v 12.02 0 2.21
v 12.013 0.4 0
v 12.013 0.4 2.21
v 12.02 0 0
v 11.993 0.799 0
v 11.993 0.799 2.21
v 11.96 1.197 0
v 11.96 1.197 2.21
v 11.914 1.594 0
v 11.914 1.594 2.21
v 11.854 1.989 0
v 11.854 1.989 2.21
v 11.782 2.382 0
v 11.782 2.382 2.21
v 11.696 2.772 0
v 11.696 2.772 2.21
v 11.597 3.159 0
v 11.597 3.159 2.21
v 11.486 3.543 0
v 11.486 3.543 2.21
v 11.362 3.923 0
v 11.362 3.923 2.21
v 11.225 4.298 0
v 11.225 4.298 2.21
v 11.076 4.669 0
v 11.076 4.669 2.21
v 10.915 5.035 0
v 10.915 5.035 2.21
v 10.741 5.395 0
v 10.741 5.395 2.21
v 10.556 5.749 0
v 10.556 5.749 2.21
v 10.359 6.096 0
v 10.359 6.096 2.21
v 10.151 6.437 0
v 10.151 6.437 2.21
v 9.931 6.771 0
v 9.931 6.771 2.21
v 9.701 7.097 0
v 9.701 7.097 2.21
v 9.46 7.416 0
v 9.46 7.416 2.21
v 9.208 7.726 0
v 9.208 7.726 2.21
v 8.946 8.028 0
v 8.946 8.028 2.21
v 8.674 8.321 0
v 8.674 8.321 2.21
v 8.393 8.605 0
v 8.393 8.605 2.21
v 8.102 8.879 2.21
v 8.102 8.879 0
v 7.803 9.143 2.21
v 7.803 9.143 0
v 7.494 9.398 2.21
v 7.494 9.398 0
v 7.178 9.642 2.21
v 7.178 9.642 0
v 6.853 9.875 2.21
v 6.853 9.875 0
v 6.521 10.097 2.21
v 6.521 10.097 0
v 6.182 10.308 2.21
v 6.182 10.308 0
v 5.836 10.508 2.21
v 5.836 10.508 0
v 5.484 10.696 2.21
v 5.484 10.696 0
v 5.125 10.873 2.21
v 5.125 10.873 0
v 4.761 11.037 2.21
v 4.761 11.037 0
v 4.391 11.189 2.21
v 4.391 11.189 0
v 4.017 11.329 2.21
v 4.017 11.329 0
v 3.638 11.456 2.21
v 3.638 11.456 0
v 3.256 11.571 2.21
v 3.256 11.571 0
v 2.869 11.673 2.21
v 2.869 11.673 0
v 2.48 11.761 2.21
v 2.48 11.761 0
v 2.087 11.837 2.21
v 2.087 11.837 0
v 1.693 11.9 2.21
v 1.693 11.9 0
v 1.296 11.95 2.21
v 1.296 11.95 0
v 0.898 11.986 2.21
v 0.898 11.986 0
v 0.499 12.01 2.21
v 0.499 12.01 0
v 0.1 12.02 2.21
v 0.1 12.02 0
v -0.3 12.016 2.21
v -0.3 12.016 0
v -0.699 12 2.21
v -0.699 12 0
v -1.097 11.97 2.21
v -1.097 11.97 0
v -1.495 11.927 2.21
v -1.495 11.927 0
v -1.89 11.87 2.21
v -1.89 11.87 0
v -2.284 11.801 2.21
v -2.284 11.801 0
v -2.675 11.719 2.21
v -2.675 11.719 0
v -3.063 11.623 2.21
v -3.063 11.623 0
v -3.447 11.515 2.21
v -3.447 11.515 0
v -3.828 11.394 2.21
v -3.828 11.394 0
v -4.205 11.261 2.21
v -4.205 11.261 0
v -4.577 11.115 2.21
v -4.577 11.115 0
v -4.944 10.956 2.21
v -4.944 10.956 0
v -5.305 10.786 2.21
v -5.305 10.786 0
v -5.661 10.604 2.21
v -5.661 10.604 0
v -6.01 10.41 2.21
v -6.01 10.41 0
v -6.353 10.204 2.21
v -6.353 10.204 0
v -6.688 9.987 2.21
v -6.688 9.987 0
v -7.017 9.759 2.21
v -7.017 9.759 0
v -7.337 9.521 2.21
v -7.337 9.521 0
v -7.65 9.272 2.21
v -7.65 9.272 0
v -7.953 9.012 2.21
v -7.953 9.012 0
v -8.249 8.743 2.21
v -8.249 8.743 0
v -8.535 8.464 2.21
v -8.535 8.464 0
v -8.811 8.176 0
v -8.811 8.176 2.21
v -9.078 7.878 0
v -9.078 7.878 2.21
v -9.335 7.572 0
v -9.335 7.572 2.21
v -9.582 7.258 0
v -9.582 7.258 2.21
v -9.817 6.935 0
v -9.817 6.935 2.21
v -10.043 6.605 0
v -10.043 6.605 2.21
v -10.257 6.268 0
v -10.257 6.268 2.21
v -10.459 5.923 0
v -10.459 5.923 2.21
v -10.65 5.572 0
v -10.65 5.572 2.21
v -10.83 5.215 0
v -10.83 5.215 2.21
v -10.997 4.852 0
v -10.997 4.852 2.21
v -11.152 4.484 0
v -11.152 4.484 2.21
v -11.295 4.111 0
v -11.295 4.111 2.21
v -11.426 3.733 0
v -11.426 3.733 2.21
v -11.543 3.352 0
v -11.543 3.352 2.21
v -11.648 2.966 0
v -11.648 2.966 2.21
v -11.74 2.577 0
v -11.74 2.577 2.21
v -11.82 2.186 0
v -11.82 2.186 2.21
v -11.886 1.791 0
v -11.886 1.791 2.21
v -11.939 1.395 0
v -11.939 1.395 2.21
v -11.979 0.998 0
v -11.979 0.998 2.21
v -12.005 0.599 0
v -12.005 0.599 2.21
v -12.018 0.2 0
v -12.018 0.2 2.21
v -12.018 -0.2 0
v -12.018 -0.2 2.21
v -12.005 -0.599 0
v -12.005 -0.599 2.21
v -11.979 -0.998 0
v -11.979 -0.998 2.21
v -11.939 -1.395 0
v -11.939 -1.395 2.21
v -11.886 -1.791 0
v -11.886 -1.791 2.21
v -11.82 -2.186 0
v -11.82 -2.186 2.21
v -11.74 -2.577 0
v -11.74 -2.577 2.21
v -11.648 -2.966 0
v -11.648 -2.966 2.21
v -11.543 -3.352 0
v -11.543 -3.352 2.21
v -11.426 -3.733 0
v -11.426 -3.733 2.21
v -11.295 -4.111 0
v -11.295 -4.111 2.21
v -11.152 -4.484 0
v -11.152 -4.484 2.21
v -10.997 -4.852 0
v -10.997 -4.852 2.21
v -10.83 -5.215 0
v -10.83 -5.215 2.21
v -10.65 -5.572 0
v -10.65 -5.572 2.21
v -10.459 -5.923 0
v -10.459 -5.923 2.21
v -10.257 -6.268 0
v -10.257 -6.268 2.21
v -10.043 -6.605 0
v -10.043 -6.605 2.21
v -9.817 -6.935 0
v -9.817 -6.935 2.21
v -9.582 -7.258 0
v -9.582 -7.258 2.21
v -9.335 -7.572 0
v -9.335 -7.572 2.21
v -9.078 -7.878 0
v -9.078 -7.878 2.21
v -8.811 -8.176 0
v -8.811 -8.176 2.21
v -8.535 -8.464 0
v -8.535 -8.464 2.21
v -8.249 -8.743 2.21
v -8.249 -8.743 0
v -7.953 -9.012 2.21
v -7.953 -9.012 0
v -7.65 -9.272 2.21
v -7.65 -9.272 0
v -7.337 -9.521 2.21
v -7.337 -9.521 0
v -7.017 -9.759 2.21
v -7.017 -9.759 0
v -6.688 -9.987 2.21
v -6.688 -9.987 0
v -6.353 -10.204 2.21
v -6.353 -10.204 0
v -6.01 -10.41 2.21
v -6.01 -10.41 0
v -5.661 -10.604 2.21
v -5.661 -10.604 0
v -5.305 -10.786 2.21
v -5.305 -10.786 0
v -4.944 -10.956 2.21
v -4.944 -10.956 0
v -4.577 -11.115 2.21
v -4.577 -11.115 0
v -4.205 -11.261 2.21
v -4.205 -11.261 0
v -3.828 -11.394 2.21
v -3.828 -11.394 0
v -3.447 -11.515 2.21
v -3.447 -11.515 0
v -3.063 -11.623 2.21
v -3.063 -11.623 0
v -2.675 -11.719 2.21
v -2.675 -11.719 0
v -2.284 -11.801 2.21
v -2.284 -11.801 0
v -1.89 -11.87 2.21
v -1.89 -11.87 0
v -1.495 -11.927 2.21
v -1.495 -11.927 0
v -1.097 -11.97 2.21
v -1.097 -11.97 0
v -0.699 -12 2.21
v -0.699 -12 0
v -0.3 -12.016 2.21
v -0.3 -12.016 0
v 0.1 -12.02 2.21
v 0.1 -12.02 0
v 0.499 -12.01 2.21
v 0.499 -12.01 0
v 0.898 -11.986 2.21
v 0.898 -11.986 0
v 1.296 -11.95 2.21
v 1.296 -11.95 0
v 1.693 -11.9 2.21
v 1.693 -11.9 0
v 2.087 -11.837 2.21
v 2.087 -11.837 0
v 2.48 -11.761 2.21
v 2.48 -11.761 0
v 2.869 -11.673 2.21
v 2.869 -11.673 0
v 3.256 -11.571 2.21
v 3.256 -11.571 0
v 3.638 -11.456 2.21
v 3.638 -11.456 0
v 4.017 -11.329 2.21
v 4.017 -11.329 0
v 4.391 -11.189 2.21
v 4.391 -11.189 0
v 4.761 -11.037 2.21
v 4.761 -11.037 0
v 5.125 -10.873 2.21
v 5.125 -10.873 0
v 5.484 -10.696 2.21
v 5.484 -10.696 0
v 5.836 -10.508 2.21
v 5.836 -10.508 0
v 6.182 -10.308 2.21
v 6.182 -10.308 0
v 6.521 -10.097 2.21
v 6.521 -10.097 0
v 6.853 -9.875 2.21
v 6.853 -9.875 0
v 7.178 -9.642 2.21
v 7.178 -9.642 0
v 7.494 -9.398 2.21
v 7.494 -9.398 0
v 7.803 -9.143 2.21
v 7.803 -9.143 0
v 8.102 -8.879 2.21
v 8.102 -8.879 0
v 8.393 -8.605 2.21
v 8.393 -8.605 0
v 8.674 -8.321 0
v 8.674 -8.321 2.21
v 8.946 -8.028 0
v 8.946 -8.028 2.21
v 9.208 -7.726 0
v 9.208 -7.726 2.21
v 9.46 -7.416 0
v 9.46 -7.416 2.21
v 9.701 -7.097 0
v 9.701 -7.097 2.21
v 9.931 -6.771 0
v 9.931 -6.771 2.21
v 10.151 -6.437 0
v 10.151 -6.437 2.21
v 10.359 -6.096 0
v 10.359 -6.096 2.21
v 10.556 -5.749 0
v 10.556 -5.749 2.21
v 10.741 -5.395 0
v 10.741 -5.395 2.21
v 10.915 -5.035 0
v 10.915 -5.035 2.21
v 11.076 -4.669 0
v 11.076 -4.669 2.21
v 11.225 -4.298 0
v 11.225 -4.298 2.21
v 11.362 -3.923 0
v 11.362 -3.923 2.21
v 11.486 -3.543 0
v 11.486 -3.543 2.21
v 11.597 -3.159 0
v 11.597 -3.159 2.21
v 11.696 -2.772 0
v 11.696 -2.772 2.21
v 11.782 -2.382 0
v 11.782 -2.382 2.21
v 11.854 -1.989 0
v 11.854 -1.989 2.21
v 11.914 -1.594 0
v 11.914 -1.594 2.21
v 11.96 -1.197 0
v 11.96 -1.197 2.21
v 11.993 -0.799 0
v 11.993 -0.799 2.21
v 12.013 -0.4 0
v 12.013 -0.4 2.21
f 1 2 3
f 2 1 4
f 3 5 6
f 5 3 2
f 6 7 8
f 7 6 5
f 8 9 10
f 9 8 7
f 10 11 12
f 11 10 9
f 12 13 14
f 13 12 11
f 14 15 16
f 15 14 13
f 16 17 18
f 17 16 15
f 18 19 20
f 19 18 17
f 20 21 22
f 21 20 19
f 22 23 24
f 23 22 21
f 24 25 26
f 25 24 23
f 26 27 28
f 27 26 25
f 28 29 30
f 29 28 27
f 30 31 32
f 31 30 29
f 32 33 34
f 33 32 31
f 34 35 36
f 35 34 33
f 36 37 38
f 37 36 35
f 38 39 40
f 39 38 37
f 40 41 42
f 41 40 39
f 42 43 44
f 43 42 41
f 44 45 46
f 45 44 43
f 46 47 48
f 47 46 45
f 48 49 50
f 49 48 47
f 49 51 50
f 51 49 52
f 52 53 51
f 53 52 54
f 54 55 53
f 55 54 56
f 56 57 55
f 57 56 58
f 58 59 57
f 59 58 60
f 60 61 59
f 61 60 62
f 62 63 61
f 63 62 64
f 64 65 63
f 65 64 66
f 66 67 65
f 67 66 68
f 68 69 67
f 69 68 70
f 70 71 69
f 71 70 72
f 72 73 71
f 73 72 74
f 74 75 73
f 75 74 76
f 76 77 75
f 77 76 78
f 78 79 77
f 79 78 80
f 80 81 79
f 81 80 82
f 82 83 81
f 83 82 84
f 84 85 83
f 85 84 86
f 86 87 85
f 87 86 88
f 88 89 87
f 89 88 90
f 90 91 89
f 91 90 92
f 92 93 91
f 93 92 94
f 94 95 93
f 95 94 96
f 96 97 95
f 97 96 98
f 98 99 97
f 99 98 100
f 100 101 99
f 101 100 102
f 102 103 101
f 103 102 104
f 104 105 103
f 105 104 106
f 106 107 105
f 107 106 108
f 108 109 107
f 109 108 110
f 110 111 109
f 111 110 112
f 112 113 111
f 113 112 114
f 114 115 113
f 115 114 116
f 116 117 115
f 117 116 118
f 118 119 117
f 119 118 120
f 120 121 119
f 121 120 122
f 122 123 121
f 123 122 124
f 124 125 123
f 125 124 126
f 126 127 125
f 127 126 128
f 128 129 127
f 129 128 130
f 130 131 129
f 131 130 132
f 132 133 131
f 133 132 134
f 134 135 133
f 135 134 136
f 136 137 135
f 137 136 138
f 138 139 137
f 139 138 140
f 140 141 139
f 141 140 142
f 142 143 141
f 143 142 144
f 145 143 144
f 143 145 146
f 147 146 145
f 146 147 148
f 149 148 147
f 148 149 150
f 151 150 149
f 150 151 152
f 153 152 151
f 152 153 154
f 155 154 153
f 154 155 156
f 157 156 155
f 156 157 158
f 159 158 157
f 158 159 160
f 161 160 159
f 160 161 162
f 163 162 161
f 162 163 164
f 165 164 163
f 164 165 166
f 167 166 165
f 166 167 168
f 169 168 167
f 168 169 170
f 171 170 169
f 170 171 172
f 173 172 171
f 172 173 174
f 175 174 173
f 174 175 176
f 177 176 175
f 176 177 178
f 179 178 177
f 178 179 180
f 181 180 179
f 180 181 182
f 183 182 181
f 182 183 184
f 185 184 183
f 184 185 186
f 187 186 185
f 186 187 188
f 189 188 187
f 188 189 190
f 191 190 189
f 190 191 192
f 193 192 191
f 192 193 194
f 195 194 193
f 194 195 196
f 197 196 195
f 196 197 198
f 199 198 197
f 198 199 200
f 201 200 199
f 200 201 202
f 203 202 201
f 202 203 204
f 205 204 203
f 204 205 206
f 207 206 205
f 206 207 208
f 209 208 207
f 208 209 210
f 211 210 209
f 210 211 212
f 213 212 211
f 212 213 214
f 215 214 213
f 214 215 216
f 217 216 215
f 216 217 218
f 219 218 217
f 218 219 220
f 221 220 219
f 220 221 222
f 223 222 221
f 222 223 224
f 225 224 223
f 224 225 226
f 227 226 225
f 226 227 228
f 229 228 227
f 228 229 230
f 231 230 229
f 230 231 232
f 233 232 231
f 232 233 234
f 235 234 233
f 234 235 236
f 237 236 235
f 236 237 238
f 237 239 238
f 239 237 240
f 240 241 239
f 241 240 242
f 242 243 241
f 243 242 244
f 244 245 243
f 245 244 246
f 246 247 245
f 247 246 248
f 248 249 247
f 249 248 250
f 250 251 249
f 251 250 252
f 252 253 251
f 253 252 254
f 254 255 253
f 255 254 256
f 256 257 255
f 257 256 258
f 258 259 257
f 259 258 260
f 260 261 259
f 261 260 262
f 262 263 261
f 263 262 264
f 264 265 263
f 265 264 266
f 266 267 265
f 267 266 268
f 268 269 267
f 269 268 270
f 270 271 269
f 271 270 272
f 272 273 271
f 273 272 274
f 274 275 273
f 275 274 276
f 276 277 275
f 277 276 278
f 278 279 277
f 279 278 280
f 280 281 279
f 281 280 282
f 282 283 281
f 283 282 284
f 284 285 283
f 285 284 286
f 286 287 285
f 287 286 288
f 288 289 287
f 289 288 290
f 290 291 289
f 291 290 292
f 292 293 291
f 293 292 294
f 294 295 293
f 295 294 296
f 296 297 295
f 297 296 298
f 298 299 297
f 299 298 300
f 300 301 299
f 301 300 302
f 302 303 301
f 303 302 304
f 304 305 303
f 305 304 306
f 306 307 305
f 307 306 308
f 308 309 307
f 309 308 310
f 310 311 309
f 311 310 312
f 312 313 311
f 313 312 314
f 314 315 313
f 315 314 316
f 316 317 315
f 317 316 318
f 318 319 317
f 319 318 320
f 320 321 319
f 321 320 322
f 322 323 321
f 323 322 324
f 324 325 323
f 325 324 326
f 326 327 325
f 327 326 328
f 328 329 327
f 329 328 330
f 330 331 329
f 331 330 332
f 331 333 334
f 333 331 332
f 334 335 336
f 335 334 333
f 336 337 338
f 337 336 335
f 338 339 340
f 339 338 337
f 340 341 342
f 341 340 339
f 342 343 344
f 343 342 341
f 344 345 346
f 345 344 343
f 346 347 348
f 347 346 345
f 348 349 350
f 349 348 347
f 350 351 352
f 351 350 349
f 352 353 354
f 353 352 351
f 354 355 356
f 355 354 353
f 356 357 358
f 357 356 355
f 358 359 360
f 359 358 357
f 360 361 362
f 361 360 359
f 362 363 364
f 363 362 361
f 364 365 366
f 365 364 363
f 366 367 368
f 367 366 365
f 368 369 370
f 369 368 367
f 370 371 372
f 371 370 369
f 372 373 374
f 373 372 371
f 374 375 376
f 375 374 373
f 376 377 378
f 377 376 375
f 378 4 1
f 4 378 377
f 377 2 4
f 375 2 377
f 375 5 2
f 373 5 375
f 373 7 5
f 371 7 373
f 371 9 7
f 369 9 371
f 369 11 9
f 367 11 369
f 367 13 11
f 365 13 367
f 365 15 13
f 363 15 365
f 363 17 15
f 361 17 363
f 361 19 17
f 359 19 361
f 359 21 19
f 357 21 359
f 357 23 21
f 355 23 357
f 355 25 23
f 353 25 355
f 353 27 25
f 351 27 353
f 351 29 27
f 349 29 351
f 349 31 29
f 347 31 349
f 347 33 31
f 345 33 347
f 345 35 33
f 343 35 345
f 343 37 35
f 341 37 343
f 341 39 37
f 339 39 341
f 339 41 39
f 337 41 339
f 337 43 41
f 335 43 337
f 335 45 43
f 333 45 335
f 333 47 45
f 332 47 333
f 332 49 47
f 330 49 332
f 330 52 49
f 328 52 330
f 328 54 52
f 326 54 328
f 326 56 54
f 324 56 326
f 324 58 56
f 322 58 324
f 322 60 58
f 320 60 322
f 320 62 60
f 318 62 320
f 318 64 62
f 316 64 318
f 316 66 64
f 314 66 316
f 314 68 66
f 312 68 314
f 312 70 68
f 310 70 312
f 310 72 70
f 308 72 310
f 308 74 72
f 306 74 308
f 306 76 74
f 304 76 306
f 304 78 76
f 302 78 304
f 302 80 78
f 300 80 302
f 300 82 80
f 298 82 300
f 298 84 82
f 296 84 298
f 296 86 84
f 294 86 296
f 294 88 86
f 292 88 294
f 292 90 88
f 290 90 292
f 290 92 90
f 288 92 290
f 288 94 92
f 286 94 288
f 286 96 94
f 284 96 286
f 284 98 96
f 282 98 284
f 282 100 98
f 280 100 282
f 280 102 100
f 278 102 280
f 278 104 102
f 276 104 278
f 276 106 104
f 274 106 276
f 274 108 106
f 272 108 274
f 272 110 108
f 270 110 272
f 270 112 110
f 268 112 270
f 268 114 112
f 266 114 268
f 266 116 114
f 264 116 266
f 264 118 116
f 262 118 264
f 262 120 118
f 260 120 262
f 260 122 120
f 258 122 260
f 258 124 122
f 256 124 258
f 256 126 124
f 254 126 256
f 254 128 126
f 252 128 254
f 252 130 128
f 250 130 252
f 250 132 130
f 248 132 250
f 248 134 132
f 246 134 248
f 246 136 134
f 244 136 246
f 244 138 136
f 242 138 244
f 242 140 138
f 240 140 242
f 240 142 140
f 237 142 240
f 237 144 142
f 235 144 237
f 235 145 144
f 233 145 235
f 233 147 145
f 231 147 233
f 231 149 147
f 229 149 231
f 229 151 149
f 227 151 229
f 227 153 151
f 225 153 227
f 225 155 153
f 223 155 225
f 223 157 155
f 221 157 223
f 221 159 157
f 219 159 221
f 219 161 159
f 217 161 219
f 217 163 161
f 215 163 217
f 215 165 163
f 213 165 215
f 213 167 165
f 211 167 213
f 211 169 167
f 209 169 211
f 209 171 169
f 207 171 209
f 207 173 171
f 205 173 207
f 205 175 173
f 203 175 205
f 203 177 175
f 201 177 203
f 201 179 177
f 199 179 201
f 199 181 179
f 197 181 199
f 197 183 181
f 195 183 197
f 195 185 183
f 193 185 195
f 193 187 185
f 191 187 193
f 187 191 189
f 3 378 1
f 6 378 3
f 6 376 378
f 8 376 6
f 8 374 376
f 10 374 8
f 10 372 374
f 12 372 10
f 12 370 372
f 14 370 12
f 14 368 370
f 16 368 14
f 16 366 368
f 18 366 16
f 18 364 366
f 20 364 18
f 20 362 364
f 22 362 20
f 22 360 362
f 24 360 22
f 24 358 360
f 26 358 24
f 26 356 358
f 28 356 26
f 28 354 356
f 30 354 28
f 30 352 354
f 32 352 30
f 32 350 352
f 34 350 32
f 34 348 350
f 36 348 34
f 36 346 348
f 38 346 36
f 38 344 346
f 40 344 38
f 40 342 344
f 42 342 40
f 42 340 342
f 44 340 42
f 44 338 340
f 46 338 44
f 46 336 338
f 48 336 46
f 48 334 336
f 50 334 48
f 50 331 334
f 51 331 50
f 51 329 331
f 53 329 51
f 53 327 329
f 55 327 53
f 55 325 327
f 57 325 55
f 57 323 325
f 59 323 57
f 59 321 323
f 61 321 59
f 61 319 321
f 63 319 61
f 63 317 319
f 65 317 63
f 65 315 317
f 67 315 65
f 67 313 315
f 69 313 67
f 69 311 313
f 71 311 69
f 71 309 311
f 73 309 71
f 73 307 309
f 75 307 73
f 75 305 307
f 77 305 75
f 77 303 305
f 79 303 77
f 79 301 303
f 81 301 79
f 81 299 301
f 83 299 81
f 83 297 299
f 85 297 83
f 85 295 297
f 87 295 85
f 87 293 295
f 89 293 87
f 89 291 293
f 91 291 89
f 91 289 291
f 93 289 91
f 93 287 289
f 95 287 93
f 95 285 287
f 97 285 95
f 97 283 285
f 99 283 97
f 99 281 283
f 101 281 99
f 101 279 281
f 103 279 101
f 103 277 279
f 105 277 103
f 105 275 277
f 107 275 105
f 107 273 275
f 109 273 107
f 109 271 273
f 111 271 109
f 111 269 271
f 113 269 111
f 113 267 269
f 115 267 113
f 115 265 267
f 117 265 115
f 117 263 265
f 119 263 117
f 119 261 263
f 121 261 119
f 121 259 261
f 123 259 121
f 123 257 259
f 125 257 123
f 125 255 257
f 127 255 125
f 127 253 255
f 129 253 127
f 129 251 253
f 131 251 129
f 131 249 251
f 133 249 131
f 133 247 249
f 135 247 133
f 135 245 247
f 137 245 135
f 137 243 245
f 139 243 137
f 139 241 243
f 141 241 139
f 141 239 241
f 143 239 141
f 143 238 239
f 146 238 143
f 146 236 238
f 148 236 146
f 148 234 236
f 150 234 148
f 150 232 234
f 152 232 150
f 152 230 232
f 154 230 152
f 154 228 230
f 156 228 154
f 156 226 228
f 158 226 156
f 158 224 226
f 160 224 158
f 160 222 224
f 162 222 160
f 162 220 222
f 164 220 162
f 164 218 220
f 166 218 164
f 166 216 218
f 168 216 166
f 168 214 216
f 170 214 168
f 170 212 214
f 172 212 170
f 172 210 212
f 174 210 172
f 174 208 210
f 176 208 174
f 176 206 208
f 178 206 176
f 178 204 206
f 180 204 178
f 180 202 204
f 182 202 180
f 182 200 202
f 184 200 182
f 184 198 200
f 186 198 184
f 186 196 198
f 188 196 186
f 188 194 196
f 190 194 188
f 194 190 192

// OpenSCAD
//Coin to unlock the carts with at my grocery store.
r = 24.24 / 2;
h = 2.21;
play = 0.1;
$fs = 0.4;
$fa = 1;

cylinder(r=r - play, h=h);
